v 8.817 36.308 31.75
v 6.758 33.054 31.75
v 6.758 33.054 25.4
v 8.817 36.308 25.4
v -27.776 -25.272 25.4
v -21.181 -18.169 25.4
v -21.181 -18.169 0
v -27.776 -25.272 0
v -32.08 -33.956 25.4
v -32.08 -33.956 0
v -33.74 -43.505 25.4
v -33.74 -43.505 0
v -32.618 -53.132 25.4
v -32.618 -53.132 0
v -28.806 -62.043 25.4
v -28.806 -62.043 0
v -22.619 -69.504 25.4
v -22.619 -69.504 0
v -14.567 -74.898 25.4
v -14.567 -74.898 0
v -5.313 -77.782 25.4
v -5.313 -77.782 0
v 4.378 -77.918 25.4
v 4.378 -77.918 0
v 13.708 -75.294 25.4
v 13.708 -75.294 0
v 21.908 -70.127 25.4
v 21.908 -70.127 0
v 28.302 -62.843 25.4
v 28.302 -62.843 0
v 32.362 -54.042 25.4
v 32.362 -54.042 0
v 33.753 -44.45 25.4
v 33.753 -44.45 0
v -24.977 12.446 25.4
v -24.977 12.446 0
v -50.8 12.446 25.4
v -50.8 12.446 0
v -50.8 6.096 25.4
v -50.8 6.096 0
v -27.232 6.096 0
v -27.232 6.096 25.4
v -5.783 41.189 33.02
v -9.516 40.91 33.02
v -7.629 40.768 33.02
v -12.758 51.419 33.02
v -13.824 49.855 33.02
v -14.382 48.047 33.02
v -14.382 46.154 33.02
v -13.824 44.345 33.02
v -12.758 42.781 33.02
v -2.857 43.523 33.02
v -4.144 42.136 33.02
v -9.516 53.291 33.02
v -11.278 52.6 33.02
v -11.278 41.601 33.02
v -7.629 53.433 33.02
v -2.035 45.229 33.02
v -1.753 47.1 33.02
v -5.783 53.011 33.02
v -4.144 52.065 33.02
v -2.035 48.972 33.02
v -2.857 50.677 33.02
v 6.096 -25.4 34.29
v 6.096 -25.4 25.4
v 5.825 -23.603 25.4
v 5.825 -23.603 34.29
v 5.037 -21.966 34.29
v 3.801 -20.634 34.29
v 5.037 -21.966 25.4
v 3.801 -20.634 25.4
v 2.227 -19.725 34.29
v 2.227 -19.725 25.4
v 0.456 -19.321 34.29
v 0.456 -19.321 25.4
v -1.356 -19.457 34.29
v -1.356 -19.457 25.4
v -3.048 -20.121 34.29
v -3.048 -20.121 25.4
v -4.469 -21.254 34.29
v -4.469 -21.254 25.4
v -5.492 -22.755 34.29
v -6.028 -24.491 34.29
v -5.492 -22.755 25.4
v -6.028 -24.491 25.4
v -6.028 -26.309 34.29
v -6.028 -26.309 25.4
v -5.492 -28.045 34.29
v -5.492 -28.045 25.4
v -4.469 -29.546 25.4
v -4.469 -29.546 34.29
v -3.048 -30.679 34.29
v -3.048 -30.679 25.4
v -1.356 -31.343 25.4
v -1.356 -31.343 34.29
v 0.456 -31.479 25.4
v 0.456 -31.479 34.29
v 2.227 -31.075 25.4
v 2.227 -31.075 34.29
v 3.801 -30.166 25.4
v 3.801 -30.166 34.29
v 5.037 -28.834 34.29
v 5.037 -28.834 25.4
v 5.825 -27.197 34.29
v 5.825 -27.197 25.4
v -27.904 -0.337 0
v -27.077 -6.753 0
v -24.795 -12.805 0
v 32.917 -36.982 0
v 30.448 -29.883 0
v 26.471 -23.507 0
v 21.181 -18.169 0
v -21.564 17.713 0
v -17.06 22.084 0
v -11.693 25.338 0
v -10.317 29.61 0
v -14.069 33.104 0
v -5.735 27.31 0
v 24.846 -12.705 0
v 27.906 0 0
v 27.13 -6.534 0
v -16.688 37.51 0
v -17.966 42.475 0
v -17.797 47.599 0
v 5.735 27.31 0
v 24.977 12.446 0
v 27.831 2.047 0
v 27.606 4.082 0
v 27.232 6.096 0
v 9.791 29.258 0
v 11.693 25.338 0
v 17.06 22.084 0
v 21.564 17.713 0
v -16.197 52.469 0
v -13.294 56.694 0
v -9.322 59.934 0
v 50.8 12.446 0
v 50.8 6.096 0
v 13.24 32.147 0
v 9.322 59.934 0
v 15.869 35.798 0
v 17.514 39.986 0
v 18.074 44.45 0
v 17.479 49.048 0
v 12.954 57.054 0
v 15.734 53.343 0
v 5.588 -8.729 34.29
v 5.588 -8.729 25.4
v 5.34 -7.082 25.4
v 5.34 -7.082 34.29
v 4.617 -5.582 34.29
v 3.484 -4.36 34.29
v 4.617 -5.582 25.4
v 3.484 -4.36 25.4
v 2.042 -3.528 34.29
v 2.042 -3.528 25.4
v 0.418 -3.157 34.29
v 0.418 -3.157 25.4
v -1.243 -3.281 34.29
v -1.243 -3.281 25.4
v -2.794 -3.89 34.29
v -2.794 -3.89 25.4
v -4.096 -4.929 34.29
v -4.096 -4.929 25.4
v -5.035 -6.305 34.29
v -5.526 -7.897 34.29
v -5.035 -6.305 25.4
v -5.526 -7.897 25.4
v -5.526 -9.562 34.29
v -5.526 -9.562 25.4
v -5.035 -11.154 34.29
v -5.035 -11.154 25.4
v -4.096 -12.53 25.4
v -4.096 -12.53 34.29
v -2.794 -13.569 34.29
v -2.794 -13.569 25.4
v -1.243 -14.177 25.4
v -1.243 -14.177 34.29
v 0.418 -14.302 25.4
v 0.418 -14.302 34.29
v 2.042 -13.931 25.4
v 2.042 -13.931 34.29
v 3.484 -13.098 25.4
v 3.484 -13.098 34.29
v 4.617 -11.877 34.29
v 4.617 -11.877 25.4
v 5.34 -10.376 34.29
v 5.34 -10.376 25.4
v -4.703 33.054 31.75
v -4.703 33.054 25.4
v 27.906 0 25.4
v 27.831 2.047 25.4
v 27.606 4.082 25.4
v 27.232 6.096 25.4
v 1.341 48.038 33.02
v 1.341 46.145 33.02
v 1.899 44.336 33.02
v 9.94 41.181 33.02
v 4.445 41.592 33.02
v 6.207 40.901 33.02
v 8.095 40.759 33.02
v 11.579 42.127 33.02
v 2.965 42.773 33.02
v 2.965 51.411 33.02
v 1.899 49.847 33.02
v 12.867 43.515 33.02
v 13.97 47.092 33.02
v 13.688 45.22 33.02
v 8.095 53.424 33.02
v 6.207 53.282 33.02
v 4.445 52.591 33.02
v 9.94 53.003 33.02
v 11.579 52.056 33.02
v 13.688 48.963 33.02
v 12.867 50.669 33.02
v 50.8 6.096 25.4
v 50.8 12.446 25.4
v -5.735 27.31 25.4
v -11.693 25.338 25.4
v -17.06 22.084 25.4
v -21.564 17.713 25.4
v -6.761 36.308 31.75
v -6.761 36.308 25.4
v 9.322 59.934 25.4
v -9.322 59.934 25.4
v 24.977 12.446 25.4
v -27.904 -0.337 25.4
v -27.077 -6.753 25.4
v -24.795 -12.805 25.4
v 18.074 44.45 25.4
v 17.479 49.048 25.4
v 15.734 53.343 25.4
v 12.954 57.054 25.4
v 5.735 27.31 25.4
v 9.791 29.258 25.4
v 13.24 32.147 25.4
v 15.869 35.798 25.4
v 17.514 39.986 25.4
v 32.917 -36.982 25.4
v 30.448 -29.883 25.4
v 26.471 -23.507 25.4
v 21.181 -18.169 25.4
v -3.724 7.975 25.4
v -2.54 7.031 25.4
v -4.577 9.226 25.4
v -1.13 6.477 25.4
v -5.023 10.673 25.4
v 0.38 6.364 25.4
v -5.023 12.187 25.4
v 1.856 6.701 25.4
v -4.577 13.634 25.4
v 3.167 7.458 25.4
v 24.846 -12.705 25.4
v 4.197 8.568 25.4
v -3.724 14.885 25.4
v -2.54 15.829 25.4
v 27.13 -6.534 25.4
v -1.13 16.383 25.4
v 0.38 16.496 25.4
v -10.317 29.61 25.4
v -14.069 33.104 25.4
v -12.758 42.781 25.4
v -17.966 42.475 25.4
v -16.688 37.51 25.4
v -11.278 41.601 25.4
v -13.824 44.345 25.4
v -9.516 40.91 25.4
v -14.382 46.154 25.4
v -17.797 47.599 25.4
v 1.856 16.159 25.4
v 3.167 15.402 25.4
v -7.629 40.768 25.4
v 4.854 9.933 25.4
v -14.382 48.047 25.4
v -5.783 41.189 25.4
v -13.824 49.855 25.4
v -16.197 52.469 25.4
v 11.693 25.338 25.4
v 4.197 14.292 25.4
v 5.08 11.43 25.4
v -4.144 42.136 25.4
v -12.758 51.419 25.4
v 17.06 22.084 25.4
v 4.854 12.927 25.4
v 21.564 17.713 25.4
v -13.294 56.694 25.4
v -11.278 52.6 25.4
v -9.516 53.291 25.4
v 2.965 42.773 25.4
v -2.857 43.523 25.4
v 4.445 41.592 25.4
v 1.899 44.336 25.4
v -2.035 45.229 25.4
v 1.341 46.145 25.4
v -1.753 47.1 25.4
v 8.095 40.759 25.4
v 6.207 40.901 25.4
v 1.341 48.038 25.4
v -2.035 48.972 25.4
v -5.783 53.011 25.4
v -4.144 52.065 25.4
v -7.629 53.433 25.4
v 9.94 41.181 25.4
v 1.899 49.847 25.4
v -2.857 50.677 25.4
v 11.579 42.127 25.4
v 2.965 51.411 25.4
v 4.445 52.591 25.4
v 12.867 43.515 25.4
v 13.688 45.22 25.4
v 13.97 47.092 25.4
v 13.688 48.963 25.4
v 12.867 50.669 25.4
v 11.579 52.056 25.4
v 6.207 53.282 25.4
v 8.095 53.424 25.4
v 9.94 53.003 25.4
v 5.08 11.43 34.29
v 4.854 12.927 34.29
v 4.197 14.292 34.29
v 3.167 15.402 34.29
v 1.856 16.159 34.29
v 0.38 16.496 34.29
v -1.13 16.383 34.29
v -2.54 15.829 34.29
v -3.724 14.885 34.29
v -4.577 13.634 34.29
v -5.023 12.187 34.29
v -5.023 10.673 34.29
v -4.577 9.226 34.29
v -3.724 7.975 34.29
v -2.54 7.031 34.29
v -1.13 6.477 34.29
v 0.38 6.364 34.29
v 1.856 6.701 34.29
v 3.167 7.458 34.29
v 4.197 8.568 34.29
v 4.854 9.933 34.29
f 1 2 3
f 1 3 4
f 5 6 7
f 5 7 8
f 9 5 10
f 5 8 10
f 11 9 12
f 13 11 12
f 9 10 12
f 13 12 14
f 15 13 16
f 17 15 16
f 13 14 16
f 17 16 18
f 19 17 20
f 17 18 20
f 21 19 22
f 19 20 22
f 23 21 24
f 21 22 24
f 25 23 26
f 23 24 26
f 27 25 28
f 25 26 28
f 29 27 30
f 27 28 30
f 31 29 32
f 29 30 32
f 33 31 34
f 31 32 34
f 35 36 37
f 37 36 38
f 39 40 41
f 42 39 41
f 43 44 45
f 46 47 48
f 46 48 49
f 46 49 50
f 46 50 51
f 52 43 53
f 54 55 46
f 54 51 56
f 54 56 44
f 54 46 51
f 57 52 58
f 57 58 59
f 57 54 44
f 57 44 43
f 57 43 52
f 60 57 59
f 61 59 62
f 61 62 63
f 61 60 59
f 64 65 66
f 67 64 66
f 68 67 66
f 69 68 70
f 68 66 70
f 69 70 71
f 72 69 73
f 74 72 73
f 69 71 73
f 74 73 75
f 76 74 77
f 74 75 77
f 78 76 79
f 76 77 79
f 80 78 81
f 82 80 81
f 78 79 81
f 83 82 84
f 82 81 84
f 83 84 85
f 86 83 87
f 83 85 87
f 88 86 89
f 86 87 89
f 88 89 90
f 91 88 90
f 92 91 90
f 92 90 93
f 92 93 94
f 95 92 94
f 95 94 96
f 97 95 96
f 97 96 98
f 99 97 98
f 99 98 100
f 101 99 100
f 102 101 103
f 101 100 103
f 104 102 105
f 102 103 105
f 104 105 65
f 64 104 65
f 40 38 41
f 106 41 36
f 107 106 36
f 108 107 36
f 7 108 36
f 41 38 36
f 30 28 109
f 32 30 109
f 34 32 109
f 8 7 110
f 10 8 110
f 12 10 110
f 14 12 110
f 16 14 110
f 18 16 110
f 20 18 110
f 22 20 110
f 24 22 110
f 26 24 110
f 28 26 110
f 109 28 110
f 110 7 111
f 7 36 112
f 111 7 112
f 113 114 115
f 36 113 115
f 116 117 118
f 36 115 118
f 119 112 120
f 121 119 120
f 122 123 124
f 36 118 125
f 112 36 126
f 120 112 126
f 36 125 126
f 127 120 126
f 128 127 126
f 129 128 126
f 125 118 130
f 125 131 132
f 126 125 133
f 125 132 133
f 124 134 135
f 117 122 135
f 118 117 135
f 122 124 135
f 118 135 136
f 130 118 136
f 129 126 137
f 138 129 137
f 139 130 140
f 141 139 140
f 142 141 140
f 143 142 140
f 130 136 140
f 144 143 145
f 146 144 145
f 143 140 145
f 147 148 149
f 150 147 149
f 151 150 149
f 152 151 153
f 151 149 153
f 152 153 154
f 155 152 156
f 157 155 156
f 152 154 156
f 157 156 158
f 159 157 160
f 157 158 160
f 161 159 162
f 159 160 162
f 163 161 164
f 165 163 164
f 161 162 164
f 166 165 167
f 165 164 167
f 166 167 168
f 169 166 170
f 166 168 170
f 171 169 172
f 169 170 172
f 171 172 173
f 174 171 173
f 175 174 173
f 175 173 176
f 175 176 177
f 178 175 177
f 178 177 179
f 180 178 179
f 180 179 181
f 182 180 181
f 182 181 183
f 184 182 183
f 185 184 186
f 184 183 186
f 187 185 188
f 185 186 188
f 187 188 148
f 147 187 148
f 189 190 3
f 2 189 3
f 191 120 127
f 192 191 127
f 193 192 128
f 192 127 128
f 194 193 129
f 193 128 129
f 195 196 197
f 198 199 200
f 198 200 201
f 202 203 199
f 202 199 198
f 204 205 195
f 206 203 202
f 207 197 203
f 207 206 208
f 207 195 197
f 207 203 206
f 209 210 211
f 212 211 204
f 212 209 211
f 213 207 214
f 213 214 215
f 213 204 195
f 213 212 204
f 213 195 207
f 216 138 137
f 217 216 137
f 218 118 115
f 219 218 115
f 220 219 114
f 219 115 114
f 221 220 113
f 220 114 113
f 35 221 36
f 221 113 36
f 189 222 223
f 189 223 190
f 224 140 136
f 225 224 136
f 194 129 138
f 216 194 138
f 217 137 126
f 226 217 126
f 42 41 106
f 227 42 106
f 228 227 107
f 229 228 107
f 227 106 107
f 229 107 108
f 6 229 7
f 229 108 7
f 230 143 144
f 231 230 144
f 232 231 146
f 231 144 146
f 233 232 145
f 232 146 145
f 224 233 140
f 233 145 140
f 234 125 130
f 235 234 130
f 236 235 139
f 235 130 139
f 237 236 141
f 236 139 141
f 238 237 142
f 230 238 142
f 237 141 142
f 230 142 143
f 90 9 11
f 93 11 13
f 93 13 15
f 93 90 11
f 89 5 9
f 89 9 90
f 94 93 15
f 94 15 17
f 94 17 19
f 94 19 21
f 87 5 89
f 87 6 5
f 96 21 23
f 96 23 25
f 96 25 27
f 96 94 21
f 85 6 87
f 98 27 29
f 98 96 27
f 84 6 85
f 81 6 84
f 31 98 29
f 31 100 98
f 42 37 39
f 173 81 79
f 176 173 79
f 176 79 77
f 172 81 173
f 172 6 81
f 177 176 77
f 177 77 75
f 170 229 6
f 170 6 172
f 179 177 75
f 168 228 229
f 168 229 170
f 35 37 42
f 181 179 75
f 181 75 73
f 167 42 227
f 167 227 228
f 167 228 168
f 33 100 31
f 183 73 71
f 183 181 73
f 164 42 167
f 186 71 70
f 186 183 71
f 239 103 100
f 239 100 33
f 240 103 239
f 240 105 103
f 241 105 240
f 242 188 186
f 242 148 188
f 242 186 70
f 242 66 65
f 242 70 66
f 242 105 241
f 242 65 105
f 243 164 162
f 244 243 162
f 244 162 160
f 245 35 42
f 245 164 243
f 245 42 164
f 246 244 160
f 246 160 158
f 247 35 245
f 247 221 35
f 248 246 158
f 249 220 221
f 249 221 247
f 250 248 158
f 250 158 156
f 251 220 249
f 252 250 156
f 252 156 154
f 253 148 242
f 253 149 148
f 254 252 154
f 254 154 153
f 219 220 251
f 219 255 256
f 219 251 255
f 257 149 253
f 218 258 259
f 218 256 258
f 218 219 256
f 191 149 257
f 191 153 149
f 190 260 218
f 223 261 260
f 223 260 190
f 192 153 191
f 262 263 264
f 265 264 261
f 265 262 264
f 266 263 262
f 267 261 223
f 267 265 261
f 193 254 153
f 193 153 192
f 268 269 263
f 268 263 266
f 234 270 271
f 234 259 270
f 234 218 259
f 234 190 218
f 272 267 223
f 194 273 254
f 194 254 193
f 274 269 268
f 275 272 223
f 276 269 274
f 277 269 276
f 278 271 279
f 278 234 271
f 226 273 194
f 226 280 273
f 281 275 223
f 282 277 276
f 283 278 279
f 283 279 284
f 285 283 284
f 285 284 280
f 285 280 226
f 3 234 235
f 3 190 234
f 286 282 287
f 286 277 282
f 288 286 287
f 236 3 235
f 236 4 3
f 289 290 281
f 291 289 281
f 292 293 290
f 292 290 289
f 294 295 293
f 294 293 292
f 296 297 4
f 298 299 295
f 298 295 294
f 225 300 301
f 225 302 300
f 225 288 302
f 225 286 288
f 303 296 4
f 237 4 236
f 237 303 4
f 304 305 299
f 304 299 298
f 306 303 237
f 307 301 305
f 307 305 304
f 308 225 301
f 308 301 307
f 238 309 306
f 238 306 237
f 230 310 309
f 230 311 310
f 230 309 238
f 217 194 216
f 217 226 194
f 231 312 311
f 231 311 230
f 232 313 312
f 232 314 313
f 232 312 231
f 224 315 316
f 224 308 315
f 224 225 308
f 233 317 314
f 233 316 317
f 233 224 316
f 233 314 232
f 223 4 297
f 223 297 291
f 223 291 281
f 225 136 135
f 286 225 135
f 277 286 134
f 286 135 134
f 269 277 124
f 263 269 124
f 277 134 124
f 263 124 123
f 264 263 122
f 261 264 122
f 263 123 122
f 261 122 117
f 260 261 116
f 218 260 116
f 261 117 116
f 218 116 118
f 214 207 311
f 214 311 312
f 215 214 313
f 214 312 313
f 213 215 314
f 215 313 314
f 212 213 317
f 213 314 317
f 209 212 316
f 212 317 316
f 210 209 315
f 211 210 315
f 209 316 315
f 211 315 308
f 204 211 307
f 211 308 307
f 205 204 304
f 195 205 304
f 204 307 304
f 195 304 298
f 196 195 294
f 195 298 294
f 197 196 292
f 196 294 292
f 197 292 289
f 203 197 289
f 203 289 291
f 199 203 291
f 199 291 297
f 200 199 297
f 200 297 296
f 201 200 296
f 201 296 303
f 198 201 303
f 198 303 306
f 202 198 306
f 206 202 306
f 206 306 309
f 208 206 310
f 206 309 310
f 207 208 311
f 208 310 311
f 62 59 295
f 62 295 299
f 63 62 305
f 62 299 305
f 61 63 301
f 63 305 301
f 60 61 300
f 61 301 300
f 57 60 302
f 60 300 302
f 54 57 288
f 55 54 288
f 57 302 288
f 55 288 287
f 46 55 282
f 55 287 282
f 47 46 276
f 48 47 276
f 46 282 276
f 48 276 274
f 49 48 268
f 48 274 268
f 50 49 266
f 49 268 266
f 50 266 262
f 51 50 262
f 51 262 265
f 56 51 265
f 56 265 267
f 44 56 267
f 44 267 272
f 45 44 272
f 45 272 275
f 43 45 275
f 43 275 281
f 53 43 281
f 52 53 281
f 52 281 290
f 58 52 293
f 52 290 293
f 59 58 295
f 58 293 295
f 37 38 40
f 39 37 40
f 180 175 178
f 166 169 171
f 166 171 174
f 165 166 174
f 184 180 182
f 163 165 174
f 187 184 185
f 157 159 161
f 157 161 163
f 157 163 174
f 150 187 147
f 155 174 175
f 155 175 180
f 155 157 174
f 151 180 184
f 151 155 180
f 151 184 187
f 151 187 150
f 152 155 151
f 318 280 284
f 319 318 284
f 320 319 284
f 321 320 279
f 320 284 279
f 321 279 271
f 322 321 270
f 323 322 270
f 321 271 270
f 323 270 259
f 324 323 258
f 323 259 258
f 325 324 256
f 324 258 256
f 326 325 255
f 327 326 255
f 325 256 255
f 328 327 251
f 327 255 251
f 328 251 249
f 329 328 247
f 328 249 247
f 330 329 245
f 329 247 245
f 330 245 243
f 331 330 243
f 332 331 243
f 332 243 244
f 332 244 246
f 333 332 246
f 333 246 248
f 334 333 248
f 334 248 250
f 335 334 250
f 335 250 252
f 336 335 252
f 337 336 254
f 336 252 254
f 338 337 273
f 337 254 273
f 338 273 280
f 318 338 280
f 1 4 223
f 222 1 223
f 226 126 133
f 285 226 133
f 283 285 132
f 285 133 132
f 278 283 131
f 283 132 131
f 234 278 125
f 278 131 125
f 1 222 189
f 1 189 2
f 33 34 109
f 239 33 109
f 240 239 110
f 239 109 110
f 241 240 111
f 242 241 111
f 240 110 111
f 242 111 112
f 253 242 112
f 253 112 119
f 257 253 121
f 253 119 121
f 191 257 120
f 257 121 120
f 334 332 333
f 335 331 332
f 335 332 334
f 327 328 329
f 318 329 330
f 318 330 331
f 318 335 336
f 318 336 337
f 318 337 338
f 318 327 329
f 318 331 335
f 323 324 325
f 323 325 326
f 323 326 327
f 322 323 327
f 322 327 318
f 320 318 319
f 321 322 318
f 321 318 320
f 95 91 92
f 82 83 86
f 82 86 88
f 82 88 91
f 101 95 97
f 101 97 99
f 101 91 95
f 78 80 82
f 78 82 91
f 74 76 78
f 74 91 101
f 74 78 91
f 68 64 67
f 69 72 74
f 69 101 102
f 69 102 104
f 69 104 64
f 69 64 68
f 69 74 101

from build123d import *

# Parameters (mm, degrees)
F1_DEPTH = 25.4
F2_R     = 6.35
F3_DEPTH = 7.62
F4_R     = 5.08
F4_R_2   = 5.588
F4_R_3   = 6.096
F5_DEPTH = 8.89
F7_DEPTH = 6.35


with BuildPart() as f1:
    # F0 (on Top) → F1 (new body)
    with BuildSketch(Plane.XY):
        with BuildLine():
            ThreePointArc((-9.321827, 59.934407), (-17.965589, 42.474951), (-5.735285, 27.310292))
            ThreePointArc((-5.735285, 27.310292), (0, 27.906012), (5.735285, 27.310292))
            ThreePointArc((5.735285, 27.310292), (14.668363, 33.890537), (18.073827, 44.450004))
            ThreePointArc((18.073827, 44.450004), (15.734426, 53.34332), (9.321827, 59.934407))
            Line((9.321827, 59.934407), (-9.321827, 59.934407))
        make_face()
        with BuildLine():
            ThreePointArc((-21.180588, -18.16943), (0, -10.696695), (21.180588, -18.16943))
            ThreePointArc((21.180588, -18.16943), (26.170702, -9.687099), (27.906012, 0))
            ThreePointArc((27.906012, 0), (27.737009, 3.066572), (27.232046, 6.096))
            Line((27.232046, 6.096), (0, 6.096))
            Line((0, 6.096), (-27.232046, 6.096))
            ThreePointArc((-27.232046, 6.096), (-27.076716, -6.752552), (-21.180588, -18.16943))
        make_face()
        with BuildLine():
            ThreePointArc((-21.180588, -18.16943), (-14.566587, -74.898327), (33.753309, -44.450004))
            ThreePointArc((33.753309, -44.450004), (30.448323, -29.883417), (21.180588, -18.16943))
            ThreePointArc((21.180588, -18.16943), (0, -27.906012), (-21.180588, -18.16943))
        make_face()
        with BuildLine():
            ThreePointArc((-21.180588, -18.16943), (0, -27.906012), (21.180588, -18.16943))
            ThreePointArc((21.180588, -18.16943), (0, -10.696695), (-21.180588, -18.16943))
        make_face()
        with BuildLine():
            ThreePointArc((5.735285, 27.310292), (0, 27.906012), (-5.735285, 27.310292))
            ThreePointArc((-5.735285, 27.310292), (0, 26.376177), (5.735285, 27.310292))
        make_face()
        with BuildLine():
            Line((-50.8, 6.096), (-27.232046, 6.096))
            ThreePointArc((-27.232046, 6.096), (-26.296817, 9.339322), (-24.976841, 12.446))
            Line((-24.976841, 12.446), (-50.8, 12.446))
            Line((-50.8, 12.446), (-50.8, 6.096))
        make_face()
        with BuildLine():
            ThreePointArc((24.976841, 12.446), (26.296817, 9.339322), (27.232046, 6.096))
            Line((27.232046, 6.096), (50.8, 6.096))
            Line((50.8, 6.096), (50.8, 12.446))
            Line((50.8, 12.446), (24.976841, 12.446))
        make_face()
        with BuildLine():
            Line((0, 6.096), (27.232046, 6.096))
            ThreePointArc((27.232046, 6.096), (26.296817, 9.339322), (24.976841, 12.446))
            Line((24.976841, 12.446), (0, 12.446))
            Line((0, 12.446), (0, 6.096))
        make_face()
        with BuildLine():
            ThreePointArc((-24.976841, 12.446), (-26.296817, 9.339322), (-27.232046, 6.096))
            Line((-27.232046, 6.096), (0, 6.096))
            Line((0, 6.096), (0, 12.446))
            Line((0, 12.446), (-24.976841, 12.446))
        make_face()
        with BuildLine():
            ThreePointArc((-5.735285, 27.310292), (-17.060055, 22.083932), (-24.976841, 12.446))
            Line((-24.976841, 12.446), (0, 12.446))
            Line((0, 12.446), (24.976841, 12.446))
            ThreePointArc((24.976841, 12.446), (17.060055, 22.083932), (5.735285, 27.310292))
            ThreePointArc((5.735285, 27.310292), (0, 26.376177), (-5.735285, 27.310292))
        make_face()
    extrude(amount=F1_DEPTH)

    # F2 (on face) → F3 (join)
    with BuildSketch(Plane.XY.offset(25.4)):
        with Locations((-8.103234, 47.100332)):
            Circle(F2_R)
        with Locations((7.62, 47.0916)):
            Circle(F2_R)
    extrude(amount=F3_DEPTH)

    # F4 (on face) → F5 (join)
    with BuildSketch(Plane.XY.offset(25.4)):
        with Locations((0, 11.43)):
            Circle(F4_R)
        with Locations((0, -8.72935)):
            Circle(F4_R_2)
        with Locations((0, -25.4)):
            Circle(F4_R_3)
    extrude(amount=F5_DEPTH)

    # F6 (on face) → F7 (join)
    with BuildSketch(Plane.XY.offset(25.4)):
        Polygon((-6.761378, 36.308393), (-4.702554, 33.054311), (6.757731, 33.054311), (8.816555, 36.308393), align=None)
    extrude(amount=F7_DEPTH)


solid = f1.part
